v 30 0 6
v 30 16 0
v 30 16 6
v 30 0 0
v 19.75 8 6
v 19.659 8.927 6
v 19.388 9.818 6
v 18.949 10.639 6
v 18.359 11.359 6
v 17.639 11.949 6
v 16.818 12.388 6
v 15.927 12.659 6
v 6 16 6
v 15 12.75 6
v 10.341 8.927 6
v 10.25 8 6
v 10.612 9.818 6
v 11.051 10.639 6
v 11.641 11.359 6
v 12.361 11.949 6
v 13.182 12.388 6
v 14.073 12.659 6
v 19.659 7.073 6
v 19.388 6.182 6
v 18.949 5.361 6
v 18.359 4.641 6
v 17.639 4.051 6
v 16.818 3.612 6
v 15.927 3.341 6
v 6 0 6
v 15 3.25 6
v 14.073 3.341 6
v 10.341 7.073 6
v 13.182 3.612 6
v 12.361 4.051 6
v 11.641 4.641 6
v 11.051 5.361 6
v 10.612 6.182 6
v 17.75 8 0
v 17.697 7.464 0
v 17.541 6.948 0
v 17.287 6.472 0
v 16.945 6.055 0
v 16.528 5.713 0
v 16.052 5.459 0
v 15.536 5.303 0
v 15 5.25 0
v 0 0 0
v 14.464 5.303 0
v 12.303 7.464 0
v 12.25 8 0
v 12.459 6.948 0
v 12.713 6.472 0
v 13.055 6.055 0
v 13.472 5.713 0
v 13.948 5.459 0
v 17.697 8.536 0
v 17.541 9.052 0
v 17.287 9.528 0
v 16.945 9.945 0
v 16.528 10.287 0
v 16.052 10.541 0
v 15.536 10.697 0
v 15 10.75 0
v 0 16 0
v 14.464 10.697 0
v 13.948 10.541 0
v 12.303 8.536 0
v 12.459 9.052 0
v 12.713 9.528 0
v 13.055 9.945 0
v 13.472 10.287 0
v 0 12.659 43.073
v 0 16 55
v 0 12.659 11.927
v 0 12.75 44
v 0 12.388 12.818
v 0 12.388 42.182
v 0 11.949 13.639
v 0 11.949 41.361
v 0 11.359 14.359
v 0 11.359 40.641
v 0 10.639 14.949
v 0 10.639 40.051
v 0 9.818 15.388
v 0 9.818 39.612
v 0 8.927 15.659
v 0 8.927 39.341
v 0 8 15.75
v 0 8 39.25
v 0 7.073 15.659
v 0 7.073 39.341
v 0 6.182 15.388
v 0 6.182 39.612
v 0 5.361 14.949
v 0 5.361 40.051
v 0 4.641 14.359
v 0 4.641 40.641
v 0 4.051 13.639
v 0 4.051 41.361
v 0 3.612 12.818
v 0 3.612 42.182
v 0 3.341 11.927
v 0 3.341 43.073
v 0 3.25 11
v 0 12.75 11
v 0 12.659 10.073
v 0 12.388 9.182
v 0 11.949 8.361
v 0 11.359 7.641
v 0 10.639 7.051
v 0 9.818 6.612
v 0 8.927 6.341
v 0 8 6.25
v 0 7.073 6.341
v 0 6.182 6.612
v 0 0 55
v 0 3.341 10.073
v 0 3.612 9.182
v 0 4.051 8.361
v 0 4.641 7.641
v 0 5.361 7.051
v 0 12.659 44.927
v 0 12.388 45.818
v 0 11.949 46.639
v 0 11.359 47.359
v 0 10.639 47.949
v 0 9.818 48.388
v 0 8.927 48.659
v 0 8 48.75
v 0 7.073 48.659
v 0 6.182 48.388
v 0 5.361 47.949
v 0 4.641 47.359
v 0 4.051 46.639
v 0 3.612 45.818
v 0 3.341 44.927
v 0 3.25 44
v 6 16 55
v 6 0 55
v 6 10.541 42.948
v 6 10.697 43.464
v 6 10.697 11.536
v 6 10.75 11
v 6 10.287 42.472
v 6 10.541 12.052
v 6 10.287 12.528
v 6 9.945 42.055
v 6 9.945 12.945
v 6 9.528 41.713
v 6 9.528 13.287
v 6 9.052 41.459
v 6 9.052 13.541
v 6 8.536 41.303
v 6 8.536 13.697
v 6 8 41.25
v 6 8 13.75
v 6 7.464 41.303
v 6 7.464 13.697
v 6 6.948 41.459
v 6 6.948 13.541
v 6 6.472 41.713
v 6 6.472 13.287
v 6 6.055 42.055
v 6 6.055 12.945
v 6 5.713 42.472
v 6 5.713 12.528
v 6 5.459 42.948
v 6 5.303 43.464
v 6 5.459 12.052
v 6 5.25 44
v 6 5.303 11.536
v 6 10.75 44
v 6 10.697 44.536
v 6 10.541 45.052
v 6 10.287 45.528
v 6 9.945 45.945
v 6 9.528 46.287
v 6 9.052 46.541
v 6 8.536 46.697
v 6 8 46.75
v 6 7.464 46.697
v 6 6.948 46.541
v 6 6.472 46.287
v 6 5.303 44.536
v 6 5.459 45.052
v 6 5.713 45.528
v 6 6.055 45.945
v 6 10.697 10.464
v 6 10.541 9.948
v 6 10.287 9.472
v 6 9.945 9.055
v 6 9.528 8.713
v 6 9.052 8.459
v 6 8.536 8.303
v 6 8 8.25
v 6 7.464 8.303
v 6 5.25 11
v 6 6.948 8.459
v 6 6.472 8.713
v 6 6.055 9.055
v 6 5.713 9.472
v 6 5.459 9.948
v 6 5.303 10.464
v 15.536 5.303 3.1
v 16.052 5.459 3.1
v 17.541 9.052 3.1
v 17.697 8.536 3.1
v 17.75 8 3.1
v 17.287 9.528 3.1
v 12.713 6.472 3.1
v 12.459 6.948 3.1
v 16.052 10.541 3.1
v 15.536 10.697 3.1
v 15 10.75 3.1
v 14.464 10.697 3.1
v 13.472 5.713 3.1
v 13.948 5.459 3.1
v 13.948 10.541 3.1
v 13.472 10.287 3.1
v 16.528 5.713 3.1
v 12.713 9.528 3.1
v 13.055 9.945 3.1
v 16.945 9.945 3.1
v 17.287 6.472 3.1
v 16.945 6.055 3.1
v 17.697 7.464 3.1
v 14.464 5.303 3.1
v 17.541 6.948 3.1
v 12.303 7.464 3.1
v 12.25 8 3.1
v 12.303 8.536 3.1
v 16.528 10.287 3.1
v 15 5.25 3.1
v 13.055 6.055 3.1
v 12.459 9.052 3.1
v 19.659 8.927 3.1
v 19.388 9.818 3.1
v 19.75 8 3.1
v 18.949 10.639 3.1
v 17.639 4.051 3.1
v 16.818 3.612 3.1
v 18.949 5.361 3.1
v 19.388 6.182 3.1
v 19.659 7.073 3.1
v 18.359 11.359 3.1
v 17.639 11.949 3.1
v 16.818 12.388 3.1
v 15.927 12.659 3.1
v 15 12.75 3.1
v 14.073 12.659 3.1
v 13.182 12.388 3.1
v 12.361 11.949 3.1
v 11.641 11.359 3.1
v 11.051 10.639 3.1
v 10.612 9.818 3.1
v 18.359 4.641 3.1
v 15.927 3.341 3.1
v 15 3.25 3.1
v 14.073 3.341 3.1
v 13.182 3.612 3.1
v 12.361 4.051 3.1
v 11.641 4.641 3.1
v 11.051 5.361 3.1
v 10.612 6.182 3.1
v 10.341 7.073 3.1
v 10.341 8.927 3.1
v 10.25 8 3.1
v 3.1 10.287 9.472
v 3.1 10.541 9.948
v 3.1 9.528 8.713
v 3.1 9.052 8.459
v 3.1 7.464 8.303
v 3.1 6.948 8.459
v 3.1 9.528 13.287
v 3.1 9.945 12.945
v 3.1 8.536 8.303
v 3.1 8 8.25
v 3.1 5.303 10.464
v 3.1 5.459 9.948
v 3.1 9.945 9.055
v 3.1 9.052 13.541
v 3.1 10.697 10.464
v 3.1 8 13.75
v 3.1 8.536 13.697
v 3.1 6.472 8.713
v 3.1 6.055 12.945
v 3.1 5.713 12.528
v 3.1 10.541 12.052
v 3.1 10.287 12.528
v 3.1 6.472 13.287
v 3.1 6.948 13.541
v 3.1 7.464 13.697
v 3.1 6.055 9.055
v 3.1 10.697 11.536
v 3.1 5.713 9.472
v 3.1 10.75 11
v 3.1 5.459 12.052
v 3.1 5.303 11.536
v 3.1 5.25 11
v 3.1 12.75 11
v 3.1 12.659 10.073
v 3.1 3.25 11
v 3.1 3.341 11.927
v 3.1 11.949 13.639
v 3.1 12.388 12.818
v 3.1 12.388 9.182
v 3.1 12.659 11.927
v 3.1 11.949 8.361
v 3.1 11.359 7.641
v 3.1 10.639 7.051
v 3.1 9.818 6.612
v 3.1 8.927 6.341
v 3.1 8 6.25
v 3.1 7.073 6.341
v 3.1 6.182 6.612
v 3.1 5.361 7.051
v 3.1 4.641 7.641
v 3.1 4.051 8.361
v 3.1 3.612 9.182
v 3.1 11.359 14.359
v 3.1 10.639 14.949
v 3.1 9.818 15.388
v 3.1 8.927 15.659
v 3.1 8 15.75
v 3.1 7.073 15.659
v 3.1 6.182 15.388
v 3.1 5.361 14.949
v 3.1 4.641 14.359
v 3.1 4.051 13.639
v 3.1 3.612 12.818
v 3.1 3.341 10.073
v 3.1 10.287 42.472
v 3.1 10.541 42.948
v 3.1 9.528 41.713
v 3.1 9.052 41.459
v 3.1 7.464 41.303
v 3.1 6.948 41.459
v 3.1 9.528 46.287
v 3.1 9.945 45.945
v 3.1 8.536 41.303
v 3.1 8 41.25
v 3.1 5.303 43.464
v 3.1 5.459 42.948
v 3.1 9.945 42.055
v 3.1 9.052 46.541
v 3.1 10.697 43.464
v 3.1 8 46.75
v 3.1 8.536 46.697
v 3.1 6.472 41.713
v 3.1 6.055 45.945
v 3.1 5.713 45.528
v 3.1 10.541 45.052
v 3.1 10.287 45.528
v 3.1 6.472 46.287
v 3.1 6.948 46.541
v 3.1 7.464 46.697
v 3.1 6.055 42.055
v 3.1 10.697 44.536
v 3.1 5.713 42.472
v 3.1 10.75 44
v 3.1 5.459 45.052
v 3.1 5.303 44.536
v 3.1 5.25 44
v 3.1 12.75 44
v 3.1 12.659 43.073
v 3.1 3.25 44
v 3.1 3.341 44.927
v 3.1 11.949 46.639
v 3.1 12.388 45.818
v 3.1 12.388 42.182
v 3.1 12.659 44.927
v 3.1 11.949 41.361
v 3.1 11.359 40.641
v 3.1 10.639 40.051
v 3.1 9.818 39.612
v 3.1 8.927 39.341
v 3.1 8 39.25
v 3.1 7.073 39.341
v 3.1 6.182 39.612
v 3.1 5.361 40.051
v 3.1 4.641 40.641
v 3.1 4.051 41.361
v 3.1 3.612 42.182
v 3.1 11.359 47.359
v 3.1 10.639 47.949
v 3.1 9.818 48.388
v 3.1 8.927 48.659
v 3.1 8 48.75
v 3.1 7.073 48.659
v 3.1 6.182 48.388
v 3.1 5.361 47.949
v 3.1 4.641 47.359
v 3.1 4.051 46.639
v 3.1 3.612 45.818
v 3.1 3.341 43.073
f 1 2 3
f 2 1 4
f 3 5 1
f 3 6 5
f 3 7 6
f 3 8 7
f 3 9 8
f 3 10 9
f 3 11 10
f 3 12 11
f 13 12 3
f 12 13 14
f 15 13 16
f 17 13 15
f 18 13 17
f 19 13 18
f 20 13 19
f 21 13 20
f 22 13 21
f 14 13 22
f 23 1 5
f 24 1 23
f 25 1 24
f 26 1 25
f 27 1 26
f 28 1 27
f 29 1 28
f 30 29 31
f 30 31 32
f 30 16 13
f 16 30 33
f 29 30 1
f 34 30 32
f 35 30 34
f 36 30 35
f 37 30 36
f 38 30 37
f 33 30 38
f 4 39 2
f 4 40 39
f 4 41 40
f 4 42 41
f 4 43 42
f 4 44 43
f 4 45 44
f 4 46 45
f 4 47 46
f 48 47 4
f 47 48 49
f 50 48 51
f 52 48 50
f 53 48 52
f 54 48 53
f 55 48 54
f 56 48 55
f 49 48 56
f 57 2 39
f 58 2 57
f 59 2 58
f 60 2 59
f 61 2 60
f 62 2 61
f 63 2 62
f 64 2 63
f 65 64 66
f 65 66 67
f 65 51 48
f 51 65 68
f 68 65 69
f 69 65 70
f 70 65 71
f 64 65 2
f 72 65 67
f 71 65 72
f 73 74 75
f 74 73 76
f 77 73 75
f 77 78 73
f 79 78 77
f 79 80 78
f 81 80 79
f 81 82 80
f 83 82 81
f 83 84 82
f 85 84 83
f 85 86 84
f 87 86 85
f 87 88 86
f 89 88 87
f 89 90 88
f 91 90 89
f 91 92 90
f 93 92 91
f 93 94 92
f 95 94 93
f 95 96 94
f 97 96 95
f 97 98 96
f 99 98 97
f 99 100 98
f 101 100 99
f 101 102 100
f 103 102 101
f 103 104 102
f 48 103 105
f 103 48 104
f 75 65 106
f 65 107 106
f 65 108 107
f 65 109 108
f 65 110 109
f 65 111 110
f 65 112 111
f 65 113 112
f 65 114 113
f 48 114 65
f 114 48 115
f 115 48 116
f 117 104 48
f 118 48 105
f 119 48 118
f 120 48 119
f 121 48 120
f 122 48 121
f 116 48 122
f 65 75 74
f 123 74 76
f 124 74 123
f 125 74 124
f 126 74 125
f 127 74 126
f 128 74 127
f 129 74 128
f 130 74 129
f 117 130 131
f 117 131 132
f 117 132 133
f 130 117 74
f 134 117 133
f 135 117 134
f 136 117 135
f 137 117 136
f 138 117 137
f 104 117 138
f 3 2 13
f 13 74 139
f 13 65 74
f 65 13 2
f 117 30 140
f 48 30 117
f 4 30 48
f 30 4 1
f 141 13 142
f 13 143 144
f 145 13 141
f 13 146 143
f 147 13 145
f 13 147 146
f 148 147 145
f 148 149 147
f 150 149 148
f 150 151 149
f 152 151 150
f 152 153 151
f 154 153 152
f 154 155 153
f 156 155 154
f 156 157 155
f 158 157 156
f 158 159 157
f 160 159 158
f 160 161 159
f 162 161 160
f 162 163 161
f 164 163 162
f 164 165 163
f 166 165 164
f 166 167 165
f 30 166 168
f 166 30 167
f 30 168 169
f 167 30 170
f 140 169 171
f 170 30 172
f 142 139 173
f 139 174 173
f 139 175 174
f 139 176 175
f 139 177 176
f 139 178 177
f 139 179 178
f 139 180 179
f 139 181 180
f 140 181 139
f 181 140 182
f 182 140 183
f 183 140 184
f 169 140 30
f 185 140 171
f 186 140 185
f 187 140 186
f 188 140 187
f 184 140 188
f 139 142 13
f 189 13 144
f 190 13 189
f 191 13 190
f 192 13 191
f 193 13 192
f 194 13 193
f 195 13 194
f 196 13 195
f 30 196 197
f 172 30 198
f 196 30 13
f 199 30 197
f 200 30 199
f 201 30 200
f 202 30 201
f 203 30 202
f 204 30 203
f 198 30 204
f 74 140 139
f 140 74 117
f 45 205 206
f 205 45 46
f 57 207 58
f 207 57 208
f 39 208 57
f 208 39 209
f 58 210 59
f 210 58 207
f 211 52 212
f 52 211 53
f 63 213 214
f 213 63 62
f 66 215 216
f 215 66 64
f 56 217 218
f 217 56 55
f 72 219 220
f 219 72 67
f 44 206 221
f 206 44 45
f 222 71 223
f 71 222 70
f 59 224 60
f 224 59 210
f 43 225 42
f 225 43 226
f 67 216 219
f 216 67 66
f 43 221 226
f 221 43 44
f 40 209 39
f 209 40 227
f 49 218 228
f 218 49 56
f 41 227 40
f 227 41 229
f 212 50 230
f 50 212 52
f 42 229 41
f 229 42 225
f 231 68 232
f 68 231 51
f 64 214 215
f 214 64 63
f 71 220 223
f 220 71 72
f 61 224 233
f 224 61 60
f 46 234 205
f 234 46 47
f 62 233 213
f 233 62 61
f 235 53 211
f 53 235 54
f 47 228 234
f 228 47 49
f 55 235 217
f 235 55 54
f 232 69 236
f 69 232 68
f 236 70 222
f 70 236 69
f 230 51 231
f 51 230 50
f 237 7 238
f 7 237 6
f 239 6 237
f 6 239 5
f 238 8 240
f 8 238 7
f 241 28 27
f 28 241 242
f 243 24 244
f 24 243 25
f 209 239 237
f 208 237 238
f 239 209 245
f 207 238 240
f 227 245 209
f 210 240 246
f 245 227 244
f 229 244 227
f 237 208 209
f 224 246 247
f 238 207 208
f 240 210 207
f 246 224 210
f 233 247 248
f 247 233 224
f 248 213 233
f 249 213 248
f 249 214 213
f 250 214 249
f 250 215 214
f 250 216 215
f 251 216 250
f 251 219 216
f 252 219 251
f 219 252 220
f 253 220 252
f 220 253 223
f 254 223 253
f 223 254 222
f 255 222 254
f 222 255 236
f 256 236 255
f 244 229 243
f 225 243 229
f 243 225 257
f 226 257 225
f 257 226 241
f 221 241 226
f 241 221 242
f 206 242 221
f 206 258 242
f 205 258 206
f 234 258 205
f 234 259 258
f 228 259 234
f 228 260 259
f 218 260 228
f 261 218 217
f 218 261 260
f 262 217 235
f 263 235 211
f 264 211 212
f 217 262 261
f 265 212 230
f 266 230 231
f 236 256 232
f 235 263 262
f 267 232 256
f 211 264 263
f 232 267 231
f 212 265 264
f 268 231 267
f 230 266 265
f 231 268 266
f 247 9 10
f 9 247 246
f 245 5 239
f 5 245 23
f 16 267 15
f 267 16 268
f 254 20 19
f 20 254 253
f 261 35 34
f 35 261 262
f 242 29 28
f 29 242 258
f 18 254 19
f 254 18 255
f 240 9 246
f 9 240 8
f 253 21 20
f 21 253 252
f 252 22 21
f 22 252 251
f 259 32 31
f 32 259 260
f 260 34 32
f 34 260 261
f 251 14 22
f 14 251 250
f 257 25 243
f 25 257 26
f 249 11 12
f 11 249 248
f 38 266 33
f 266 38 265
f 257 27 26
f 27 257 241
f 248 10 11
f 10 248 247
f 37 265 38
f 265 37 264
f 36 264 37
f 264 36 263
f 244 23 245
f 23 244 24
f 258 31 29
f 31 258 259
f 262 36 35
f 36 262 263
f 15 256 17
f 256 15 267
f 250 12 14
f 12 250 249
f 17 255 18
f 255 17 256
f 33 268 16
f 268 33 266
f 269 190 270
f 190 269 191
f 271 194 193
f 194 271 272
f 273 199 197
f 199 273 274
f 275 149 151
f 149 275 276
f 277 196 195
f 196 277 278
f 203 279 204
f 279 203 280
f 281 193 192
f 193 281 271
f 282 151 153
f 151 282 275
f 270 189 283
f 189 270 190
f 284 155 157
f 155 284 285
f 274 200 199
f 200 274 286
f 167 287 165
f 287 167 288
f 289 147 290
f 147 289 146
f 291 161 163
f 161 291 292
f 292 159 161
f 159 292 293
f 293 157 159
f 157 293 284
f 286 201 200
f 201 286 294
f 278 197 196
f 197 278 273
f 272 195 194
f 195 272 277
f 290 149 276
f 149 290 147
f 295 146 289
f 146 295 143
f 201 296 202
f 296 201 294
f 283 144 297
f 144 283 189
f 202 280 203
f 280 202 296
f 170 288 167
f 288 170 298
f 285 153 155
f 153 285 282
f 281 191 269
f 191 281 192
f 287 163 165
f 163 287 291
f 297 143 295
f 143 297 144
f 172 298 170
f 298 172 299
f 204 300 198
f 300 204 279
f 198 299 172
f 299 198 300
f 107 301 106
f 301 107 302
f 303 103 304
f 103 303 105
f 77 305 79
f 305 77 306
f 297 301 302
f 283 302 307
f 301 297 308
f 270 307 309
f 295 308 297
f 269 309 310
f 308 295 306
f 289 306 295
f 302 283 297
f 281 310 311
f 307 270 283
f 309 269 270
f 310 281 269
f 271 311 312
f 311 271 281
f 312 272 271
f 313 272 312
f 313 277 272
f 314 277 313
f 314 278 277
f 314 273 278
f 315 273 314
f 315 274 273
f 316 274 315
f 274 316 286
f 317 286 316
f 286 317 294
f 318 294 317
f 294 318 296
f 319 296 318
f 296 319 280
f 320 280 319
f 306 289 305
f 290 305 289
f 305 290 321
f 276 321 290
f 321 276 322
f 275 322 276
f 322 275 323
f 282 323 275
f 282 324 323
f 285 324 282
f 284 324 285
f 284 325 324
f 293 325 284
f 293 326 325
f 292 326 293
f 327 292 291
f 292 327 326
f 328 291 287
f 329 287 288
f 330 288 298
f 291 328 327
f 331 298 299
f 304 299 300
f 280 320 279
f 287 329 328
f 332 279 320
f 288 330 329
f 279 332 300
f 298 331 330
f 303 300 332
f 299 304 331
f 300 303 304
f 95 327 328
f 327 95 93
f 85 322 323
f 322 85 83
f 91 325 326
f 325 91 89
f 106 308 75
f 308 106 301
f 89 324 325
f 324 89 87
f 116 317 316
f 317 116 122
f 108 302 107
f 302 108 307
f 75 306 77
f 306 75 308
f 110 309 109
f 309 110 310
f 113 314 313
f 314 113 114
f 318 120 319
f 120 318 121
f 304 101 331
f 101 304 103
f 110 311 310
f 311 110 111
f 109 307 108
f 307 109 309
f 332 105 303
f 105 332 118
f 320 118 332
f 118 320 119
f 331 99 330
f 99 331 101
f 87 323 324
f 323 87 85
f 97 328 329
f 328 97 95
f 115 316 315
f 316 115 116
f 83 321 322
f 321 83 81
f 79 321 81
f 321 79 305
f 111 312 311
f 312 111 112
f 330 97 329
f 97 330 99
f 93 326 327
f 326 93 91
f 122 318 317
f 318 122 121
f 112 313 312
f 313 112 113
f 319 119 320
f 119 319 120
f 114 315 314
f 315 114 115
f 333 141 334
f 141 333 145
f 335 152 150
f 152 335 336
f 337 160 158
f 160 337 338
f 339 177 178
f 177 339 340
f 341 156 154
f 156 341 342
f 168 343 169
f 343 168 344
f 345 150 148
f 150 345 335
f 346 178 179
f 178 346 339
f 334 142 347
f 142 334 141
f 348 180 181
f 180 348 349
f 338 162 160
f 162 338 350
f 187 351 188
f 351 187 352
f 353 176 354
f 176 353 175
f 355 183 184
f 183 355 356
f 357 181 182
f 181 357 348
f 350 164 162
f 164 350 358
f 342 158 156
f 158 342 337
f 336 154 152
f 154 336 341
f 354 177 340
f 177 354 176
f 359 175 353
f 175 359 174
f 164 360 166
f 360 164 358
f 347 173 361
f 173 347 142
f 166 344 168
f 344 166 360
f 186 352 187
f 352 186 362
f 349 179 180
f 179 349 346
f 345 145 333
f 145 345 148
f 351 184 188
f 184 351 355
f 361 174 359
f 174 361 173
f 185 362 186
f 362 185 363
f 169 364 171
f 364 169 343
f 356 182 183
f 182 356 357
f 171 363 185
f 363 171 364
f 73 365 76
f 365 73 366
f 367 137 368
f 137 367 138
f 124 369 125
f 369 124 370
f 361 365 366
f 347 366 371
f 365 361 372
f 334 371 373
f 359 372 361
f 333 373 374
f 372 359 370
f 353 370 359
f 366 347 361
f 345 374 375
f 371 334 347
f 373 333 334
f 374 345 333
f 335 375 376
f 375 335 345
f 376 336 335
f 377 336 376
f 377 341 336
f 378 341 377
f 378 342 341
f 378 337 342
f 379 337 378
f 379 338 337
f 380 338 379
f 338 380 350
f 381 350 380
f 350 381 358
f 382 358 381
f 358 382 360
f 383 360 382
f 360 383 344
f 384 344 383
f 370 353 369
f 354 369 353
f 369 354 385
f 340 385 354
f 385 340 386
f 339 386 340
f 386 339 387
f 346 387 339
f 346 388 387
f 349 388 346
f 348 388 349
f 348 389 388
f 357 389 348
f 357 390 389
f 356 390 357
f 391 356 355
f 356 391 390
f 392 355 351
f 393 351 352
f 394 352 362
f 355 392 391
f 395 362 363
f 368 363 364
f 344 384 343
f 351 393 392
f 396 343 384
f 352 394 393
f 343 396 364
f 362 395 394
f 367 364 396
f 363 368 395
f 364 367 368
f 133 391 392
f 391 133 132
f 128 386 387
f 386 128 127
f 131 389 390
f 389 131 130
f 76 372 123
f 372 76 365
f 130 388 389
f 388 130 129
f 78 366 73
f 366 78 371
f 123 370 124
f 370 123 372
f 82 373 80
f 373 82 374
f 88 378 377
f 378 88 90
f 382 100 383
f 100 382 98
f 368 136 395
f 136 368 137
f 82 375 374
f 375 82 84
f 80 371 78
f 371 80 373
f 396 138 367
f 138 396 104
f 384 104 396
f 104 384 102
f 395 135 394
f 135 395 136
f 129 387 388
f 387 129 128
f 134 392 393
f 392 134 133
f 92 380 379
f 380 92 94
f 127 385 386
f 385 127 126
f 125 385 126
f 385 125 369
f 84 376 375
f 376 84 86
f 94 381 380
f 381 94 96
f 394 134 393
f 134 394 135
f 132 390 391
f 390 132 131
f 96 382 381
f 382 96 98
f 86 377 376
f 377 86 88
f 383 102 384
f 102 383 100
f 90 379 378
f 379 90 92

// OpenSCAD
$fn = 32;

// ----------------------------------------------------------------------
// L-bracket: 30 x 16 x 55 mm
// ----------------------------------------------------------------------

// --- parameters (mm) ---
horiz_len = 30;           // horizontal leg, X
vert_len = 55;            // vertical leg, Z
profile_w = 16;           // bracket depth, Y
plate_t = 6;              // plate thickness
hole_d = 5.5;             // clearance for M5
cb_d = 9.5;               // counterbore seat
cb_h = 2.9;               // counterbore depth

module hole_z(px, py) {
  translate([px, py, -0.5]) cylinder(h = plate_t + 1, d = hole_d);
}
module hole_x(pz, py) {
  translate([-0.5, py, pz]) rotate([0, 90, 0]) cylinder(h = plate_t + 1, d = hole_d);
}
module cb_z(px, py) {
  translate([px, py, plate_t - cb_h]) cylinder(h = cb_h + 0.4, d = cb_d);
}
module cb_x(pz, py) {
  translate([plate_t - cb_h, py, pz]) rotate([0, -90, 0]) cylinder(h = cb_h + 0.4, d = cb_d);
}

difference() {
  union() {
    /* horizontal leg */
    cube([horiz_len, profile_w, plate_t]);
    /* vertical leg, overlapping the corner block */
    cube([plate_t, profile_w, vert_len]);
  }
  hole_z(15, 8);
  cb_z(15, 8);
  hole_x(11, 8);
  cb_x(11, 8);
  hole_x(44, 8);
  cb_x(44, 8);
}
